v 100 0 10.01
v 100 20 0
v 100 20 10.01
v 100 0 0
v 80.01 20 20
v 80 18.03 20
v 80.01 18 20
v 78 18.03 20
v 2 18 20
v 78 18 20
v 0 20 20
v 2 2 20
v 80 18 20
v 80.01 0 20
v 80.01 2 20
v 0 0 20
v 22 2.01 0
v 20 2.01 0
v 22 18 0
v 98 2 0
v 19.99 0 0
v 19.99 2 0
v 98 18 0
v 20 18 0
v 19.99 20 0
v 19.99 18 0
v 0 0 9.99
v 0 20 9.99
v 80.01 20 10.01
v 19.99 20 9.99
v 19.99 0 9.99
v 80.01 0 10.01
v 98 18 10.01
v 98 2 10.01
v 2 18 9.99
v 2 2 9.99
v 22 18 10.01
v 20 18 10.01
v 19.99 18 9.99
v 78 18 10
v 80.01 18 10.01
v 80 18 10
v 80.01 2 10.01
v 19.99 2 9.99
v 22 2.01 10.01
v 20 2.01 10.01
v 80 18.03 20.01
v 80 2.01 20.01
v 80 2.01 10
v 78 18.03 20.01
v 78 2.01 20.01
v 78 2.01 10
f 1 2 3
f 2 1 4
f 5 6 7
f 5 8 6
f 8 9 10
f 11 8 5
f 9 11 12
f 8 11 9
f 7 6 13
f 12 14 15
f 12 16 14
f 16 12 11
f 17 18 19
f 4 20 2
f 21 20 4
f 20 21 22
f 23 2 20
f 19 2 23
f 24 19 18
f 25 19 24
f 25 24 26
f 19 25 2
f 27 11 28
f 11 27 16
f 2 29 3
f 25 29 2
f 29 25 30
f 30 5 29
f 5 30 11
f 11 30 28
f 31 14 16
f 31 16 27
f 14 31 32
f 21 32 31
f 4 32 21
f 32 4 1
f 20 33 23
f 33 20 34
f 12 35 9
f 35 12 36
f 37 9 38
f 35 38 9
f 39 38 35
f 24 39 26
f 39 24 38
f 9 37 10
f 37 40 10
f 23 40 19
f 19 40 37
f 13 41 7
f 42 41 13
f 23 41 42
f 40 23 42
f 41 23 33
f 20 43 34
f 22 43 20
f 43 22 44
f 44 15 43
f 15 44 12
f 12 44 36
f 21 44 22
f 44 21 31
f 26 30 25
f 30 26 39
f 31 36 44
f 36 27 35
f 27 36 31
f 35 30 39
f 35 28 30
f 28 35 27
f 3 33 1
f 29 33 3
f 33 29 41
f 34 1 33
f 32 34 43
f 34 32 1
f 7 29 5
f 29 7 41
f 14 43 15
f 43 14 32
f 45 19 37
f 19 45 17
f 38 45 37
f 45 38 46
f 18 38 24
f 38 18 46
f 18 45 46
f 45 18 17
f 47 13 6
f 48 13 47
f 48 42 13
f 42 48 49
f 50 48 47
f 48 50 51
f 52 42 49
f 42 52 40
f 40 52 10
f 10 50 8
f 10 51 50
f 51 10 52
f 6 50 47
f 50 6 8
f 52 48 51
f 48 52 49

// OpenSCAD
difference() {
cube([100, 20, 20]);
translate([2, 2, -.01])
cube([96, 16, 20+.02]);
translate([-.01, -.01, -.01])
cube([20, 20+.02, 10]);
translate([100-20+.01, -.01, 10+.01])
cube([20, 20+.02, 10]);
};
translate([20, 2.01, 0])
cube([2, 16.02, 10.01]);
translate([100-20-2, 2.01, 10])
cube([2, 16.02, 10.01]);
